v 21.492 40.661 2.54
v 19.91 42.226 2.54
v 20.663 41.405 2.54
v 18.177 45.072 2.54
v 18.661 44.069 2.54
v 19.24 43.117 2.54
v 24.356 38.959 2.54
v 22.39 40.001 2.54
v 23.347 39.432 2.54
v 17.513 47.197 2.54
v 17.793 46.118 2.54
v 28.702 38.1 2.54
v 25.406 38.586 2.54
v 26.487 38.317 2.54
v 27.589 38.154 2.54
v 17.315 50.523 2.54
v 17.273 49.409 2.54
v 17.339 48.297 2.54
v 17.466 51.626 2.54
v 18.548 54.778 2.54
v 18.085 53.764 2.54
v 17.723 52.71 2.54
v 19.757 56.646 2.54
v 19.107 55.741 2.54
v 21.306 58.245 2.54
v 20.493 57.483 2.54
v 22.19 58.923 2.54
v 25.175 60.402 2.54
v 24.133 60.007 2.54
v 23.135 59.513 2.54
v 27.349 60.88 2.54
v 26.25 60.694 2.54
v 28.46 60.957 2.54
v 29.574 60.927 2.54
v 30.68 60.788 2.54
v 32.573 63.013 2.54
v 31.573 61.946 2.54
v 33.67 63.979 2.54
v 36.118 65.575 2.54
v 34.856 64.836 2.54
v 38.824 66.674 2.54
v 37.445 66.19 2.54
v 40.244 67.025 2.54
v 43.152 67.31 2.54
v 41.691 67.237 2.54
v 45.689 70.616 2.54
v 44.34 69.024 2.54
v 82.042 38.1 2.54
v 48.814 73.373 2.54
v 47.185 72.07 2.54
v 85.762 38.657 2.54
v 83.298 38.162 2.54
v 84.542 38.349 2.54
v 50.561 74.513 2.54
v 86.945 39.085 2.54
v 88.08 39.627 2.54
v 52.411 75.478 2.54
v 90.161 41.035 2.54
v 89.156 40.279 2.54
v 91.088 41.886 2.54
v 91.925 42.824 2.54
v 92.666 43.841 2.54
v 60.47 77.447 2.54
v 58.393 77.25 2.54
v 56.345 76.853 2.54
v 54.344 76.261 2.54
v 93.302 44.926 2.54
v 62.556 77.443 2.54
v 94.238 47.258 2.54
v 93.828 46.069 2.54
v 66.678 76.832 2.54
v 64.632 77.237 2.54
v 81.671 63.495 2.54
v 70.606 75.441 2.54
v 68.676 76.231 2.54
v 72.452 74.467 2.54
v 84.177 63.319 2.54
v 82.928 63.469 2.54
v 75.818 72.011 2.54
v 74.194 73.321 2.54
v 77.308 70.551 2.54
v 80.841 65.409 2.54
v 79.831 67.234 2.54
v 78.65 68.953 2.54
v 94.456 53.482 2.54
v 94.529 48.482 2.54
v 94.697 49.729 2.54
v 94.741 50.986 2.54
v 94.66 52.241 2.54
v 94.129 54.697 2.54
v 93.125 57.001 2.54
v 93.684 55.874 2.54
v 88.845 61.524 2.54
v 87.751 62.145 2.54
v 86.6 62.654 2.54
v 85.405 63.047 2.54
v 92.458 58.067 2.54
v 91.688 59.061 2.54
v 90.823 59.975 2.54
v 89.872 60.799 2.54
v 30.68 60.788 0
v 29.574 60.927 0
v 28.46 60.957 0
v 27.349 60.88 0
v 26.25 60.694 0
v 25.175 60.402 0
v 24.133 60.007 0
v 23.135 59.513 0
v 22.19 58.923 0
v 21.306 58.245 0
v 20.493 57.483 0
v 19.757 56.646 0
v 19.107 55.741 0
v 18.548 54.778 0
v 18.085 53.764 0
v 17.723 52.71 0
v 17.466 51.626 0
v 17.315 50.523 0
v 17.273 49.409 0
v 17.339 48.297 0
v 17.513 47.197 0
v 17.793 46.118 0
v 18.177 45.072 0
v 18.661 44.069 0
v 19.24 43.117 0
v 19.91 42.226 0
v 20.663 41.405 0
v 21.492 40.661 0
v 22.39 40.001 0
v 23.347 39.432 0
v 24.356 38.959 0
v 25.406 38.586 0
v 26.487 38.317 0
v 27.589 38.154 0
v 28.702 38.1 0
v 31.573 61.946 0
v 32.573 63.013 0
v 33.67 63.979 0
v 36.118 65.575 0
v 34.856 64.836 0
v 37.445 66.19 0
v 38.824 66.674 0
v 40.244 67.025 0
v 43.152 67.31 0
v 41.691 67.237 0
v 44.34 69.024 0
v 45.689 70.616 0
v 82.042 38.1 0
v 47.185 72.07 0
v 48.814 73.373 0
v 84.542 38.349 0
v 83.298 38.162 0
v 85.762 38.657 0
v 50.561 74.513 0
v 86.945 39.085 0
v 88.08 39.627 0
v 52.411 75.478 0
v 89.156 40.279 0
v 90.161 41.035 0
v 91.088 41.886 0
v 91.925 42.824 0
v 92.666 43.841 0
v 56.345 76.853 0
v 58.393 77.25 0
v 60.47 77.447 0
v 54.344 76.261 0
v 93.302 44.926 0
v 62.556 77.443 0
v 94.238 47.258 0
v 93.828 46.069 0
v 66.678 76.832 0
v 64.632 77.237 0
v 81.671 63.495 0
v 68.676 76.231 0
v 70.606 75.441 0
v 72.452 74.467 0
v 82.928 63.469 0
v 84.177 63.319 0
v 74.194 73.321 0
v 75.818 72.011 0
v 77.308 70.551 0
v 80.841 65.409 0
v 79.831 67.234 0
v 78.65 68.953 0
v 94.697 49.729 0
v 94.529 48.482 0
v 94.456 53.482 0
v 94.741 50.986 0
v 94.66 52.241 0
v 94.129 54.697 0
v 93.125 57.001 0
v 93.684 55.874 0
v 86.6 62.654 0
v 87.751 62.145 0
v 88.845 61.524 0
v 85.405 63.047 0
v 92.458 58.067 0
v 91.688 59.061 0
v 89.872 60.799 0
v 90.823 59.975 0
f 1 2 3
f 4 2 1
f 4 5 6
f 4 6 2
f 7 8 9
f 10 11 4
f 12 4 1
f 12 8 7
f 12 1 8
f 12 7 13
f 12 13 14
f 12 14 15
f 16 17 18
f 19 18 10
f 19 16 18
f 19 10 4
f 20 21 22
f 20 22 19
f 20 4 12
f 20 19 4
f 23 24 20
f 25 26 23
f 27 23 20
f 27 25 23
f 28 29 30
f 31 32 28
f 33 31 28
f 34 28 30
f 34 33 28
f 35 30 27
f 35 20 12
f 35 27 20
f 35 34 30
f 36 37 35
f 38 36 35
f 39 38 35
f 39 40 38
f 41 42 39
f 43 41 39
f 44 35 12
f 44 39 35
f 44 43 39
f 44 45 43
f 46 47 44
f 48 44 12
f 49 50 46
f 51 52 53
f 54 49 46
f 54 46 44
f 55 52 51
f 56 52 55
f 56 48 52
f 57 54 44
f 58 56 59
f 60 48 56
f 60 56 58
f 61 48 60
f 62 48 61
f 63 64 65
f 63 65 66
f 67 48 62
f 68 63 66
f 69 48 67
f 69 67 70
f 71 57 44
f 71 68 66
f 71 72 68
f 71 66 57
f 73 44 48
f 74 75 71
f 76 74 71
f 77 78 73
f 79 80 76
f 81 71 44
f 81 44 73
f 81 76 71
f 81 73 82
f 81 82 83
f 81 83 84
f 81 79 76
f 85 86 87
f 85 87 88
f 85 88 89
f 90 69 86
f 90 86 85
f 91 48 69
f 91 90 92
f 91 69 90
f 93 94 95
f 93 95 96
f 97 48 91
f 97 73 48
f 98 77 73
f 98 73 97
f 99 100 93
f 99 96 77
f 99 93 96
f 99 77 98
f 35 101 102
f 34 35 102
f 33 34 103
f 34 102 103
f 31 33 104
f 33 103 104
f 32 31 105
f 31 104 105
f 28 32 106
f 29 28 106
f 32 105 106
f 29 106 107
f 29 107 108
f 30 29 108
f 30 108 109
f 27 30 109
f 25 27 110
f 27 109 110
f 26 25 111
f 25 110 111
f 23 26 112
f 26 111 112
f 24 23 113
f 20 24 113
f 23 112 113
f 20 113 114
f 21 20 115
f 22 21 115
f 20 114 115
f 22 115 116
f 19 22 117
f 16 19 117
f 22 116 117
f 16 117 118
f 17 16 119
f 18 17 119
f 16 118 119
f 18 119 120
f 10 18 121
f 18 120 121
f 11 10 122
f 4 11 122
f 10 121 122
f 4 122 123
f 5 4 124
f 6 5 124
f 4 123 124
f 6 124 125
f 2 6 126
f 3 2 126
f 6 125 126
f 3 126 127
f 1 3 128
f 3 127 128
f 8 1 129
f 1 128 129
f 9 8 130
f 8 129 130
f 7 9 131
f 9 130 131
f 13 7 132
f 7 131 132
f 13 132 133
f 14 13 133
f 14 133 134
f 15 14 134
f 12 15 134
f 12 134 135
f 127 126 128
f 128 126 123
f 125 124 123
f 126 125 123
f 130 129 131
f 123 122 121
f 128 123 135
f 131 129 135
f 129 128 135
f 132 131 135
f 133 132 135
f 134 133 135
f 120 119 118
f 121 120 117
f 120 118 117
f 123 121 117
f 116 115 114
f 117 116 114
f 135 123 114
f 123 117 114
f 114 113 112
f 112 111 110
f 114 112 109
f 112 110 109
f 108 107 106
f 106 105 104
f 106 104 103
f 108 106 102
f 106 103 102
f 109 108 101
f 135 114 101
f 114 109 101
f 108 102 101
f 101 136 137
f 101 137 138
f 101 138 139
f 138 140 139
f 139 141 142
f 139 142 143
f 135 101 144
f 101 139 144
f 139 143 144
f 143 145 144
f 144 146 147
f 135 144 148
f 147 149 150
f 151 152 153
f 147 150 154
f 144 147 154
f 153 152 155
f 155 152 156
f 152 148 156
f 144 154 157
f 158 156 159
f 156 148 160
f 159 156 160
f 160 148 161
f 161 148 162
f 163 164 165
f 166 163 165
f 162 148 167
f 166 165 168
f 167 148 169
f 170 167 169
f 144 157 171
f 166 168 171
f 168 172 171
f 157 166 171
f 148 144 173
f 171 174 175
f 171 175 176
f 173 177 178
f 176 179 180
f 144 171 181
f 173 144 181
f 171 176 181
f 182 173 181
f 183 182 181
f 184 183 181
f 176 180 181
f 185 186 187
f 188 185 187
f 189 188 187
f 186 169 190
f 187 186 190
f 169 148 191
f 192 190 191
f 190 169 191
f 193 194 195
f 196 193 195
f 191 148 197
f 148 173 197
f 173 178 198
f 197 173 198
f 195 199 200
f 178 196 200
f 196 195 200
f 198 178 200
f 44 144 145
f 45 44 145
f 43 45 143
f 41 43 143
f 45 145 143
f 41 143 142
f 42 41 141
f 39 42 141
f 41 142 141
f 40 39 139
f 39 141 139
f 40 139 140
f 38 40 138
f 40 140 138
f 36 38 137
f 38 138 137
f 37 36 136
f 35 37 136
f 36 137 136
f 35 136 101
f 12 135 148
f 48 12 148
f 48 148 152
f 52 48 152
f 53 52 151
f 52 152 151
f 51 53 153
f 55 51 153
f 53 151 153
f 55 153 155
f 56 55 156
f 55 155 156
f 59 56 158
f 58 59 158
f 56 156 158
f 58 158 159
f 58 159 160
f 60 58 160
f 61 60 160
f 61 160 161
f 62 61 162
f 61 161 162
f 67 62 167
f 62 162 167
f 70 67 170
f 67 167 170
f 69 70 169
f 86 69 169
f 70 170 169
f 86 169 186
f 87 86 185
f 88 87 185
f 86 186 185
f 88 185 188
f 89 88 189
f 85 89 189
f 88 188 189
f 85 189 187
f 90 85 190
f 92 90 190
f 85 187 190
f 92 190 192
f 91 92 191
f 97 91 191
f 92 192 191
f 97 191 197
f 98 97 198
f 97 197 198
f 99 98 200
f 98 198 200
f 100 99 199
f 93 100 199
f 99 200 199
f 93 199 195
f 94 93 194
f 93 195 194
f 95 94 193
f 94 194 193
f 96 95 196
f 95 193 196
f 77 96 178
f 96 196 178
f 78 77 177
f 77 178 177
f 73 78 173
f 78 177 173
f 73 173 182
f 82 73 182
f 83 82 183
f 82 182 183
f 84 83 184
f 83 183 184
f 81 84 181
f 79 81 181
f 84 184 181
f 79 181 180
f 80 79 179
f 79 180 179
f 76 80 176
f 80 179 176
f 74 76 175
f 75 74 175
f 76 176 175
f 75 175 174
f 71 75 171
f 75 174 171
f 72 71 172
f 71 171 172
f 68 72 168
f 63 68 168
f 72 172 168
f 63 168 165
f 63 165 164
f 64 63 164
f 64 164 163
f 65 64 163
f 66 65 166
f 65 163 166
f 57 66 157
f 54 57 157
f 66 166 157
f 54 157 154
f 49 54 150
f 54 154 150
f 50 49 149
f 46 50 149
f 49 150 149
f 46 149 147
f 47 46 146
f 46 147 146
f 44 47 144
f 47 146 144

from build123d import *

# Parameters (mm, degrees)
PAD_DEPTH = 2.54


with BuildPart() as part:
    # Sketch → Pad (new body)
    with BuildSketch(Plane.XY):
        with BuildLine():
            ThreePointArc((30.679575, 60.787624), (17.315176, 50.522537), (28.702, 38.1))
            Line((28.702, 38.1), (82.042, 38.1))
            ThreePointArc((82.042, 38.1), (94.740642, 50.985703), (81.670634, 63.494569))
            ThreePointArc((81.670634, 63.494569), (63.596138, 77.364858), (43.151783, 67.309974))
            ThreePointArc((43.151783, 67.309974), (36.117636, 65.574837), (30.679575, 60.787624))
        make_face()
    extrude(amount=PAD_DEPTH)


solid = part.part
